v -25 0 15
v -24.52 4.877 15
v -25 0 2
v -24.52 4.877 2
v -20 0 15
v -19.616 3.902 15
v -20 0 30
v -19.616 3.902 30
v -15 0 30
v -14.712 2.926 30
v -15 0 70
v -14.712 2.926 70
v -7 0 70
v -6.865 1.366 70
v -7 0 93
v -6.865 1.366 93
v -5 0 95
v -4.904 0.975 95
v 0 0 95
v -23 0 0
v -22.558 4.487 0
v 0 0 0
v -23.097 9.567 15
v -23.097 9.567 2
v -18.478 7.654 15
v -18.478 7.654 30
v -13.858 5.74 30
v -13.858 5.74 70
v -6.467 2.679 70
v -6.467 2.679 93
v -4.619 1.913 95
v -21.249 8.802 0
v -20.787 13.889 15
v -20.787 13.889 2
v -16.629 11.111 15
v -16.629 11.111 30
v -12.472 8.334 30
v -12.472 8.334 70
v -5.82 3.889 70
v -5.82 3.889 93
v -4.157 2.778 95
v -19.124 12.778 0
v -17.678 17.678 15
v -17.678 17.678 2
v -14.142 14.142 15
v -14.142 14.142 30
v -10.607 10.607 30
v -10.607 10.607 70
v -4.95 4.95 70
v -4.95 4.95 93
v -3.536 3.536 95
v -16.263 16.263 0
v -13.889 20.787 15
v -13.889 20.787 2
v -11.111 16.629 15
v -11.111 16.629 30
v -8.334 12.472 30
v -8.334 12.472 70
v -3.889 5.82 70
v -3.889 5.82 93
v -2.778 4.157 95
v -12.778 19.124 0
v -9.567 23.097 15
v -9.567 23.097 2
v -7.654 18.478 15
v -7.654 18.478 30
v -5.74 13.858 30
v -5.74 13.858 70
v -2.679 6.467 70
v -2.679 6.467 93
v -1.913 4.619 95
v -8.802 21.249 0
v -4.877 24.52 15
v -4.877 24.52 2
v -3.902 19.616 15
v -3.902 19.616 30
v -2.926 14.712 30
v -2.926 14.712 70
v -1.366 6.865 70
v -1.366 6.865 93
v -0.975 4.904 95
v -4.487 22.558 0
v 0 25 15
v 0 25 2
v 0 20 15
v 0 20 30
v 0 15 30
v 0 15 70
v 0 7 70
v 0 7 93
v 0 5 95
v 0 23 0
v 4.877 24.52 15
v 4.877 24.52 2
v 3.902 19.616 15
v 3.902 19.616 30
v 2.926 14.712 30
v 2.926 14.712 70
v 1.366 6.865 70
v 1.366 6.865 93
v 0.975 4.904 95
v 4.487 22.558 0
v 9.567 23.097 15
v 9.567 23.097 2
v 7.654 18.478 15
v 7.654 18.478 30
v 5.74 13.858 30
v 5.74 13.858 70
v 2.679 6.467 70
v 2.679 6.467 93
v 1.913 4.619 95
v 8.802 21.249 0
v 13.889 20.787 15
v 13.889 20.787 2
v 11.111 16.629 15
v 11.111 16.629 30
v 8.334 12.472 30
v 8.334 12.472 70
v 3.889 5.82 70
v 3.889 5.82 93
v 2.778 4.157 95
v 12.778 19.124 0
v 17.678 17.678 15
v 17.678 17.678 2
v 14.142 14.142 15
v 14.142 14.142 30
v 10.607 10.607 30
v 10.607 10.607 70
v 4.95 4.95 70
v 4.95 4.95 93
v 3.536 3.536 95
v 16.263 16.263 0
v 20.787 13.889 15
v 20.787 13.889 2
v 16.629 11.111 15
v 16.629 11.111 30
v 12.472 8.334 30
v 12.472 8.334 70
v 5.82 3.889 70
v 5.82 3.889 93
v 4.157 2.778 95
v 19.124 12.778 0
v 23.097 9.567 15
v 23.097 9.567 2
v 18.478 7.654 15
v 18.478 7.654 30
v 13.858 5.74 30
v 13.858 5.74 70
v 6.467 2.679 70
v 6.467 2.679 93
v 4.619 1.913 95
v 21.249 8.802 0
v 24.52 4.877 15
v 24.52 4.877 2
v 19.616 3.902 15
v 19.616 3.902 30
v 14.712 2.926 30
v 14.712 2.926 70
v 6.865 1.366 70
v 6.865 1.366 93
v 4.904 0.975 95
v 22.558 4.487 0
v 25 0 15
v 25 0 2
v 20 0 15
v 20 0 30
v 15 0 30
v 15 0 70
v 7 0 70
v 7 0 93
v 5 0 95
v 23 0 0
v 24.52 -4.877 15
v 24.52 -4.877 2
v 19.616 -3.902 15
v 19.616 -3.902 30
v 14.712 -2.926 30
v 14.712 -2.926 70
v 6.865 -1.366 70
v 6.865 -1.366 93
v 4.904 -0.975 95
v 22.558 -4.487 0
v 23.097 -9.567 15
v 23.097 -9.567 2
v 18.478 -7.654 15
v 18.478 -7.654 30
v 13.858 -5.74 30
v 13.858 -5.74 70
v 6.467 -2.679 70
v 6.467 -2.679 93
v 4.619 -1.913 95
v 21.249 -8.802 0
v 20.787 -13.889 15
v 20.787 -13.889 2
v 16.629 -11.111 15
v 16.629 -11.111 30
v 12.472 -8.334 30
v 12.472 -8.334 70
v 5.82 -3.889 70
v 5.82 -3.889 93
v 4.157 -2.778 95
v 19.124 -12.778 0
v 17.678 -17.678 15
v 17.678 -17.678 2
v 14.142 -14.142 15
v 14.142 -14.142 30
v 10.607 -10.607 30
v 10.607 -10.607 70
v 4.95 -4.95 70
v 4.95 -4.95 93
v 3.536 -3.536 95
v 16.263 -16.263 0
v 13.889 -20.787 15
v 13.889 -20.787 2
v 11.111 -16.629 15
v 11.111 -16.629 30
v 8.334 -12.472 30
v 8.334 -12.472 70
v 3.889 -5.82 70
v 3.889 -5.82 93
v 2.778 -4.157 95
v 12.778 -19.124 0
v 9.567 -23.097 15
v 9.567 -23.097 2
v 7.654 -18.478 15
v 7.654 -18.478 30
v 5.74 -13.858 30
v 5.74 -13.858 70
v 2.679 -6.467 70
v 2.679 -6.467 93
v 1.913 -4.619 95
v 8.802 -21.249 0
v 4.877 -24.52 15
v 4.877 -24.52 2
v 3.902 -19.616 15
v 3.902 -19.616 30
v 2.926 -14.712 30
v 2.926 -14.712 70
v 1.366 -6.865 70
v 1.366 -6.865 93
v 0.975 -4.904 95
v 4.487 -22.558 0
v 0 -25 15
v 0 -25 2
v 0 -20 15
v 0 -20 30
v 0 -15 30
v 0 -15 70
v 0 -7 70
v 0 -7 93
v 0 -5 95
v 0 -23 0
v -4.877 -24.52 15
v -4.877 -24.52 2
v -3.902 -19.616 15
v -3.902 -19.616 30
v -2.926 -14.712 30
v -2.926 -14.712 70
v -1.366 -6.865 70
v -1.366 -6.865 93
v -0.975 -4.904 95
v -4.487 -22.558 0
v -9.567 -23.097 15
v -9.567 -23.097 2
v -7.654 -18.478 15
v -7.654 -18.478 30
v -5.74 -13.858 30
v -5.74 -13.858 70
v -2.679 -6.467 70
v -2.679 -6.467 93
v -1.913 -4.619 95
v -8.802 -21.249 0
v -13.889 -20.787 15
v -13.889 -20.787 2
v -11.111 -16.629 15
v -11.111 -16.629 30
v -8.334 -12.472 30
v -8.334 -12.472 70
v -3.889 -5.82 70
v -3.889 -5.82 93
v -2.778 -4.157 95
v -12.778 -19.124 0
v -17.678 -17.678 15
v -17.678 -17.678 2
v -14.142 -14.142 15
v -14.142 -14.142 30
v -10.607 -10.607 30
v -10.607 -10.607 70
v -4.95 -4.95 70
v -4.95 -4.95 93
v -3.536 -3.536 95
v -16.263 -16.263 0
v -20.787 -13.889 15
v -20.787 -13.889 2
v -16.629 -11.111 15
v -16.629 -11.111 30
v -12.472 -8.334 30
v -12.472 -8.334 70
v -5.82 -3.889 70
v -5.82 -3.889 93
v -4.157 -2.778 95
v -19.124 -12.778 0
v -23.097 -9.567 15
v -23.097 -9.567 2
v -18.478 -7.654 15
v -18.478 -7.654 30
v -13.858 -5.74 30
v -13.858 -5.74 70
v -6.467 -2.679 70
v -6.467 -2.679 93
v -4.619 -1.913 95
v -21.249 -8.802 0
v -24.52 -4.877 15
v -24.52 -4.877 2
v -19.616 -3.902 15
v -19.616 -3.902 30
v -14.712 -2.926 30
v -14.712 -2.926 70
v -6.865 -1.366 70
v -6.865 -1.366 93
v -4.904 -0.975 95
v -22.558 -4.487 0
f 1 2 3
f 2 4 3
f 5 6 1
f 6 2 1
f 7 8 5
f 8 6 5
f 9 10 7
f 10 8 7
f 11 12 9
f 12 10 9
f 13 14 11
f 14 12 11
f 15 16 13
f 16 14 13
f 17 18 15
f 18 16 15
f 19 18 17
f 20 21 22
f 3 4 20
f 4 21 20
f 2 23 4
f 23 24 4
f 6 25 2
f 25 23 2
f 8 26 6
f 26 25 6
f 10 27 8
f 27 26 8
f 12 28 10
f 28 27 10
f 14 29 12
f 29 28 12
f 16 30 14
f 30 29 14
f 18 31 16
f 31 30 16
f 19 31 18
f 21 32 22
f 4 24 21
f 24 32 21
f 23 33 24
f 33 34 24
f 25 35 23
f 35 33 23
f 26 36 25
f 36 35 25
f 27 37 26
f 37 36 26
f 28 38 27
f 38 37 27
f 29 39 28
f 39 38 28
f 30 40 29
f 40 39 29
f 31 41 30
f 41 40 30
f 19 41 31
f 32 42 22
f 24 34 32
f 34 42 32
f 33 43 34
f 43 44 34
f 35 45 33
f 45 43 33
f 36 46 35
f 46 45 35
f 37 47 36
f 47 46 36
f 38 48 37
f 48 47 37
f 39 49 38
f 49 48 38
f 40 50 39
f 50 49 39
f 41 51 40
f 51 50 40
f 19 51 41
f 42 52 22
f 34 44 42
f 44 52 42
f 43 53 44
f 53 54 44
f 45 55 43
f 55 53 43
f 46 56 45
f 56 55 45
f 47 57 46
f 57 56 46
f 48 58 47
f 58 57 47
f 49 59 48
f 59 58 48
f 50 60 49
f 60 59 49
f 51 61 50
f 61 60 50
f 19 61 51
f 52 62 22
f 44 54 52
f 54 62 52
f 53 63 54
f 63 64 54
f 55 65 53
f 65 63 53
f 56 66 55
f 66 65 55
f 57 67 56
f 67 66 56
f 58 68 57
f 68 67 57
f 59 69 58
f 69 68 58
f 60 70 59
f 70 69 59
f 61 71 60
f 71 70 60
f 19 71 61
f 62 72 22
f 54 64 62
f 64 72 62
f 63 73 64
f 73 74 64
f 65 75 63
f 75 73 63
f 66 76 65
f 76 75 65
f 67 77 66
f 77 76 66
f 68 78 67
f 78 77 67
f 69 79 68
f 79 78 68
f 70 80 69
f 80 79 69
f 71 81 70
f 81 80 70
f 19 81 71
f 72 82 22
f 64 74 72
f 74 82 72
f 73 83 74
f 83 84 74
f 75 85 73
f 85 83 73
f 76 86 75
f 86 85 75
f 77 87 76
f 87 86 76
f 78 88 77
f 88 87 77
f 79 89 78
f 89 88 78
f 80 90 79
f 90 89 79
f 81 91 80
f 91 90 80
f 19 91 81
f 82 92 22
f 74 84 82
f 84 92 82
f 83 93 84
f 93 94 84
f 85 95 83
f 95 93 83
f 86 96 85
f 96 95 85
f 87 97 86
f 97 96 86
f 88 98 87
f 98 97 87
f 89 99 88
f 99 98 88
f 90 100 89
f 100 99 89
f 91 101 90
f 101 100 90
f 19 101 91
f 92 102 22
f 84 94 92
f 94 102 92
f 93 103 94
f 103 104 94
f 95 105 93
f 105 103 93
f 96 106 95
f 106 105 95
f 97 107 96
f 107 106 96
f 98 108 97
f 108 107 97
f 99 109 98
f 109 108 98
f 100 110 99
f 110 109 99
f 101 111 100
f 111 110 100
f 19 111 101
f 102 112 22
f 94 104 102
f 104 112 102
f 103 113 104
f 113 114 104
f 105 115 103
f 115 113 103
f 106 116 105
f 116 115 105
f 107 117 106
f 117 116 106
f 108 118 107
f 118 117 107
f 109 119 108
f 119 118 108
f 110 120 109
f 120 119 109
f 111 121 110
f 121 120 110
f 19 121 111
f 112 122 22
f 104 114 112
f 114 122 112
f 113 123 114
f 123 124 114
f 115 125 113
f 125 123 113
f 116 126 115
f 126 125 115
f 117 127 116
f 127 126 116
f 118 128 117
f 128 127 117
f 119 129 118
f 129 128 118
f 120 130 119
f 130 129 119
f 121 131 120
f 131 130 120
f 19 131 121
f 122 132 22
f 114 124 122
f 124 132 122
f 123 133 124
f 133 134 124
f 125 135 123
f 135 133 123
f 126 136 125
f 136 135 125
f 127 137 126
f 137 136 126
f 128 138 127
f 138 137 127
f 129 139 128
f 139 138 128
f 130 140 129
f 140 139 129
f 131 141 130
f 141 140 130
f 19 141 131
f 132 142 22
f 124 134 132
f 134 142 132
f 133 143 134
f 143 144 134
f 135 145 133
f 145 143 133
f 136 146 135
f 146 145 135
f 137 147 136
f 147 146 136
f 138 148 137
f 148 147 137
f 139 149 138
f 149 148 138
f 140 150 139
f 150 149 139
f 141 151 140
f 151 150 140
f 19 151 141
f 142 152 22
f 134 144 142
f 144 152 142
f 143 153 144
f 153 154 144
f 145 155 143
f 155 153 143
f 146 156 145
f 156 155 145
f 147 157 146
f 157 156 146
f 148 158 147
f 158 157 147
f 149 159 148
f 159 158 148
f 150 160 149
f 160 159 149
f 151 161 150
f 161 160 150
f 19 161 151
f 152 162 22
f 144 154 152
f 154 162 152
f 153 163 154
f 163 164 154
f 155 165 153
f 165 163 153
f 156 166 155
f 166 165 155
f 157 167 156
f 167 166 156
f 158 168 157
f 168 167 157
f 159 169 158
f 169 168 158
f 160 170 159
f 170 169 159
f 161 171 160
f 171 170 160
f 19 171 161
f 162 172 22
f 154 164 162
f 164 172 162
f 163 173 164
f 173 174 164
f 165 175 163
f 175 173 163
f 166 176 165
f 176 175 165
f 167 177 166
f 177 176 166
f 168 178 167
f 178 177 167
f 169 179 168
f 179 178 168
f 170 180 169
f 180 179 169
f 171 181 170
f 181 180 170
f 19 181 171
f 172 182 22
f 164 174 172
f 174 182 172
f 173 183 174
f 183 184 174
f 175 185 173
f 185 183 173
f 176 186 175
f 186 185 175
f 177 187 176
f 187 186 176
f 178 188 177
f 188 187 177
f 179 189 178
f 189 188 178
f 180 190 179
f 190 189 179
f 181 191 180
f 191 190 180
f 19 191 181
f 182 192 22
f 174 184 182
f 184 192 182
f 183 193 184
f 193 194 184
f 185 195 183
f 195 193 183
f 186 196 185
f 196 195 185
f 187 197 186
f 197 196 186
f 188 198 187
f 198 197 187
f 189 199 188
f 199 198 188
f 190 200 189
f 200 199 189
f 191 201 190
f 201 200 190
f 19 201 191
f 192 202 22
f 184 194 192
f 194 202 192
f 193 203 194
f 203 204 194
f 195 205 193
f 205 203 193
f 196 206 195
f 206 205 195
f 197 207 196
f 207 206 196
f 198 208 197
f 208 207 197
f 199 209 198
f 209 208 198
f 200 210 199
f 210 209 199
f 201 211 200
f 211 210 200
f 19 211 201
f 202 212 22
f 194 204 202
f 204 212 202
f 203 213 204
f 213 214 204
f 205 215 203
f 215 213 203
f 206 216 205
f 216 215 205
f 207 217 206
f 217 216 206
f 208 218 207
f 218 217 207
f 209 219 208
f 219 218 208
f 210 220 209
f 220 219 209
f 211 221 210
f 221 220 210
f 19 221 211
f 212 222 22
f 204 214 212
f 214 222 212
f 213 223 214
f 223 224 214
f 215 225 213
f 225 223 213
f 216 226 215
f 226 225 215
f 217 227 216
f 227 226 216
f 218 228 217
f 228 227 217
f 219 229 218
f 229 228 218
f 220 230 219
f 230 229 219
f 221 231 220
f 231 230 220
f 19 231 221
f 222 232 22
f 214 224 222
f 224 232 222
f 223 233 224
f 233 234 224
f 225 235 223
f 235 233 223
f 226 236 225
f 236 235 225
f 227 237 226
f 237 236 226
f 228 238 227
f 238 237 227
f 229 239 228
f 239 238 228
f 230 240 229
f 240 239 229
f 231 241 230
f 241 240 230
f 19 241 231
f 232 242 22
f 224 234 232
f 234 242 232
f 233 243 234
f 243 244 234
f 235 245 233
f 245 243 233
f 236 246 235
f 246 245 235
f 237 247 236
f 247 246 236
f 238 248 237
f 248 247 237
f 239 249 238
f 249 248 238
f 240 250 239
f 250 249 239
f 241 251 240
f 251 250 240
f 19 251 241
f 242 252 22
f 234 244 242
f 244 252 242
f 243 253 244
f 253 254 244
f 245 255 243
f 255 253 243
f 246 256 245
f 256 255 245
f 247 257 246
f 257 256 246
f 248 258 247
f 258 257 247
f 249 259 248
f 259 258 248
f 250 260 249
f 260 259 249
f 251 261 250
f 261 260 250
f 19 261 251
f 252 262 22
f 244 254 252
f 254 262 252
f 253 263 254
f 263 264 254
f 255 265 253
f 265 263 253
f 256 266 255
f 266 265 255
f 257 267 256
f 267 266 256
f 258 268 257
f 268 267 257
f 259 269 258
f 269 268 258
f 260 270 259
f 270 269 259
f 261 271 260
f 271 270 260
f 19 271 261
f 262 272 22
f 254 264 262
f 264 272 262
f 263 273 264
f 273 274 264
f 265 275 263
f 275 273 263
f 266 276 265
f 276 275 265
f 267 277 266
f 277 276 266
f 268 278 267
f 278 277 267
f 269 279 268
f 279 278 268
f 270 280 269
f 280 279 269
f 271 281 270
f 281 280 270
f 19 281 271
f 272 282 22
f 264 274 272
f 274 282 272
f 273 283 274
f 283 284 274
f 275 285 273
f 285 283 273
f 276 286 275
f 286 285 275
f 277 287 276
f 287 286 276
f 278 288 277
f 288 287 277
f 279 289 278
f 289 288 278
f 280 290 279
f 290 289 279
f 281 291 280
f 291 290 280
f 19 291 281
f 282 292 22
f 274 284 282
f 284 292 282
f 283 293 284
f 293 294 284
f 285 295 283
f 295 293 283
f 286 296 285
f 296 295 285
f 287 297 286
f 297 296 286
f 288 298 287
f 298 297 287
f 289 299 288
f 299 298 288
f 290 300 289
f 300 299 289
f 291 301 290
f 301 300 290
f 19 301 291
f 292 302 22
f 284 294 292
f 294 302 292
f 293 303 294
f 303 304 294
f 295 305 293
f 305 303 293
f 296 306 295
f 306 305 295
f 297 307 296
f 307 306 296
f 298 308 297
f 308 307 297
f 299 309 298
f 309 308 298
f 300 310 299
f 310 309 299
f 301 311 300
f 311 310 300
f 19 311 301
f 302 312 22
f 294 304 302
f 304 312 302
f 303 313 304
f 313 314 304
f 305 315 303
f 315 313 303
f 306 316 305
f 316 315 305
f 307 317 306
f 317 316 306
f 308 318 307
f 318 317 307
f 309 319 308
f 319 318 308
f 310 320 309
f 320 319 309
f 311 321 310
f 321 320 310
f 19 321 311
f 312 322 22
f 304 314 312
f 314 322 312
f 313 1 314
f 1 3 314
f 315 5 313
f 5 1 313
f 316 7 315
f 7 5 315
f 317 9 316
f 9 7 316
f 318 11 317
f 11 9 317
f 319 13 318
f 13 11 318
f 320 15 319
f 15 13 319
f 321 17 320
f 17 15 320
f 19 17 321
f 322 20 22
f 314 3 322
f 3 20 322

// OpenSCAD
$fn = 32;

// ----------------------------------------------------------------------
// Stepped shaft: diameters 50, 40, 30, 14 mm, 95 mm long
// ----------------------------------------------------------------------

// --- parameters (mm) ---
d1 = 50;                  // step 1 diameter
len1 = 15;                // step 1 length
d2 = 40;                  // step 2 diameter
len2 = 15;                // step 2 length
d3 = 30;                  // step 3 diameter
len3 = 40;                // step 3 length
d4 = 14;                  // step 4 diameter
len4 = 25;                // step 4 length
total = 95;               // overall length
chamfer = 2;              // end chamfer

/* closed turning profile: x is the radius, y is the length */
profile = [[0, 0], [25 - chamfer, 0], [25, chamfer], [25, 15], [20, 15], [20, 30], [15, 30], [15, 70], [7, 70], [7, 93], [5, 95], [0, 95]];

difference() {
  rotate_extrude() polygon(profile);
}
